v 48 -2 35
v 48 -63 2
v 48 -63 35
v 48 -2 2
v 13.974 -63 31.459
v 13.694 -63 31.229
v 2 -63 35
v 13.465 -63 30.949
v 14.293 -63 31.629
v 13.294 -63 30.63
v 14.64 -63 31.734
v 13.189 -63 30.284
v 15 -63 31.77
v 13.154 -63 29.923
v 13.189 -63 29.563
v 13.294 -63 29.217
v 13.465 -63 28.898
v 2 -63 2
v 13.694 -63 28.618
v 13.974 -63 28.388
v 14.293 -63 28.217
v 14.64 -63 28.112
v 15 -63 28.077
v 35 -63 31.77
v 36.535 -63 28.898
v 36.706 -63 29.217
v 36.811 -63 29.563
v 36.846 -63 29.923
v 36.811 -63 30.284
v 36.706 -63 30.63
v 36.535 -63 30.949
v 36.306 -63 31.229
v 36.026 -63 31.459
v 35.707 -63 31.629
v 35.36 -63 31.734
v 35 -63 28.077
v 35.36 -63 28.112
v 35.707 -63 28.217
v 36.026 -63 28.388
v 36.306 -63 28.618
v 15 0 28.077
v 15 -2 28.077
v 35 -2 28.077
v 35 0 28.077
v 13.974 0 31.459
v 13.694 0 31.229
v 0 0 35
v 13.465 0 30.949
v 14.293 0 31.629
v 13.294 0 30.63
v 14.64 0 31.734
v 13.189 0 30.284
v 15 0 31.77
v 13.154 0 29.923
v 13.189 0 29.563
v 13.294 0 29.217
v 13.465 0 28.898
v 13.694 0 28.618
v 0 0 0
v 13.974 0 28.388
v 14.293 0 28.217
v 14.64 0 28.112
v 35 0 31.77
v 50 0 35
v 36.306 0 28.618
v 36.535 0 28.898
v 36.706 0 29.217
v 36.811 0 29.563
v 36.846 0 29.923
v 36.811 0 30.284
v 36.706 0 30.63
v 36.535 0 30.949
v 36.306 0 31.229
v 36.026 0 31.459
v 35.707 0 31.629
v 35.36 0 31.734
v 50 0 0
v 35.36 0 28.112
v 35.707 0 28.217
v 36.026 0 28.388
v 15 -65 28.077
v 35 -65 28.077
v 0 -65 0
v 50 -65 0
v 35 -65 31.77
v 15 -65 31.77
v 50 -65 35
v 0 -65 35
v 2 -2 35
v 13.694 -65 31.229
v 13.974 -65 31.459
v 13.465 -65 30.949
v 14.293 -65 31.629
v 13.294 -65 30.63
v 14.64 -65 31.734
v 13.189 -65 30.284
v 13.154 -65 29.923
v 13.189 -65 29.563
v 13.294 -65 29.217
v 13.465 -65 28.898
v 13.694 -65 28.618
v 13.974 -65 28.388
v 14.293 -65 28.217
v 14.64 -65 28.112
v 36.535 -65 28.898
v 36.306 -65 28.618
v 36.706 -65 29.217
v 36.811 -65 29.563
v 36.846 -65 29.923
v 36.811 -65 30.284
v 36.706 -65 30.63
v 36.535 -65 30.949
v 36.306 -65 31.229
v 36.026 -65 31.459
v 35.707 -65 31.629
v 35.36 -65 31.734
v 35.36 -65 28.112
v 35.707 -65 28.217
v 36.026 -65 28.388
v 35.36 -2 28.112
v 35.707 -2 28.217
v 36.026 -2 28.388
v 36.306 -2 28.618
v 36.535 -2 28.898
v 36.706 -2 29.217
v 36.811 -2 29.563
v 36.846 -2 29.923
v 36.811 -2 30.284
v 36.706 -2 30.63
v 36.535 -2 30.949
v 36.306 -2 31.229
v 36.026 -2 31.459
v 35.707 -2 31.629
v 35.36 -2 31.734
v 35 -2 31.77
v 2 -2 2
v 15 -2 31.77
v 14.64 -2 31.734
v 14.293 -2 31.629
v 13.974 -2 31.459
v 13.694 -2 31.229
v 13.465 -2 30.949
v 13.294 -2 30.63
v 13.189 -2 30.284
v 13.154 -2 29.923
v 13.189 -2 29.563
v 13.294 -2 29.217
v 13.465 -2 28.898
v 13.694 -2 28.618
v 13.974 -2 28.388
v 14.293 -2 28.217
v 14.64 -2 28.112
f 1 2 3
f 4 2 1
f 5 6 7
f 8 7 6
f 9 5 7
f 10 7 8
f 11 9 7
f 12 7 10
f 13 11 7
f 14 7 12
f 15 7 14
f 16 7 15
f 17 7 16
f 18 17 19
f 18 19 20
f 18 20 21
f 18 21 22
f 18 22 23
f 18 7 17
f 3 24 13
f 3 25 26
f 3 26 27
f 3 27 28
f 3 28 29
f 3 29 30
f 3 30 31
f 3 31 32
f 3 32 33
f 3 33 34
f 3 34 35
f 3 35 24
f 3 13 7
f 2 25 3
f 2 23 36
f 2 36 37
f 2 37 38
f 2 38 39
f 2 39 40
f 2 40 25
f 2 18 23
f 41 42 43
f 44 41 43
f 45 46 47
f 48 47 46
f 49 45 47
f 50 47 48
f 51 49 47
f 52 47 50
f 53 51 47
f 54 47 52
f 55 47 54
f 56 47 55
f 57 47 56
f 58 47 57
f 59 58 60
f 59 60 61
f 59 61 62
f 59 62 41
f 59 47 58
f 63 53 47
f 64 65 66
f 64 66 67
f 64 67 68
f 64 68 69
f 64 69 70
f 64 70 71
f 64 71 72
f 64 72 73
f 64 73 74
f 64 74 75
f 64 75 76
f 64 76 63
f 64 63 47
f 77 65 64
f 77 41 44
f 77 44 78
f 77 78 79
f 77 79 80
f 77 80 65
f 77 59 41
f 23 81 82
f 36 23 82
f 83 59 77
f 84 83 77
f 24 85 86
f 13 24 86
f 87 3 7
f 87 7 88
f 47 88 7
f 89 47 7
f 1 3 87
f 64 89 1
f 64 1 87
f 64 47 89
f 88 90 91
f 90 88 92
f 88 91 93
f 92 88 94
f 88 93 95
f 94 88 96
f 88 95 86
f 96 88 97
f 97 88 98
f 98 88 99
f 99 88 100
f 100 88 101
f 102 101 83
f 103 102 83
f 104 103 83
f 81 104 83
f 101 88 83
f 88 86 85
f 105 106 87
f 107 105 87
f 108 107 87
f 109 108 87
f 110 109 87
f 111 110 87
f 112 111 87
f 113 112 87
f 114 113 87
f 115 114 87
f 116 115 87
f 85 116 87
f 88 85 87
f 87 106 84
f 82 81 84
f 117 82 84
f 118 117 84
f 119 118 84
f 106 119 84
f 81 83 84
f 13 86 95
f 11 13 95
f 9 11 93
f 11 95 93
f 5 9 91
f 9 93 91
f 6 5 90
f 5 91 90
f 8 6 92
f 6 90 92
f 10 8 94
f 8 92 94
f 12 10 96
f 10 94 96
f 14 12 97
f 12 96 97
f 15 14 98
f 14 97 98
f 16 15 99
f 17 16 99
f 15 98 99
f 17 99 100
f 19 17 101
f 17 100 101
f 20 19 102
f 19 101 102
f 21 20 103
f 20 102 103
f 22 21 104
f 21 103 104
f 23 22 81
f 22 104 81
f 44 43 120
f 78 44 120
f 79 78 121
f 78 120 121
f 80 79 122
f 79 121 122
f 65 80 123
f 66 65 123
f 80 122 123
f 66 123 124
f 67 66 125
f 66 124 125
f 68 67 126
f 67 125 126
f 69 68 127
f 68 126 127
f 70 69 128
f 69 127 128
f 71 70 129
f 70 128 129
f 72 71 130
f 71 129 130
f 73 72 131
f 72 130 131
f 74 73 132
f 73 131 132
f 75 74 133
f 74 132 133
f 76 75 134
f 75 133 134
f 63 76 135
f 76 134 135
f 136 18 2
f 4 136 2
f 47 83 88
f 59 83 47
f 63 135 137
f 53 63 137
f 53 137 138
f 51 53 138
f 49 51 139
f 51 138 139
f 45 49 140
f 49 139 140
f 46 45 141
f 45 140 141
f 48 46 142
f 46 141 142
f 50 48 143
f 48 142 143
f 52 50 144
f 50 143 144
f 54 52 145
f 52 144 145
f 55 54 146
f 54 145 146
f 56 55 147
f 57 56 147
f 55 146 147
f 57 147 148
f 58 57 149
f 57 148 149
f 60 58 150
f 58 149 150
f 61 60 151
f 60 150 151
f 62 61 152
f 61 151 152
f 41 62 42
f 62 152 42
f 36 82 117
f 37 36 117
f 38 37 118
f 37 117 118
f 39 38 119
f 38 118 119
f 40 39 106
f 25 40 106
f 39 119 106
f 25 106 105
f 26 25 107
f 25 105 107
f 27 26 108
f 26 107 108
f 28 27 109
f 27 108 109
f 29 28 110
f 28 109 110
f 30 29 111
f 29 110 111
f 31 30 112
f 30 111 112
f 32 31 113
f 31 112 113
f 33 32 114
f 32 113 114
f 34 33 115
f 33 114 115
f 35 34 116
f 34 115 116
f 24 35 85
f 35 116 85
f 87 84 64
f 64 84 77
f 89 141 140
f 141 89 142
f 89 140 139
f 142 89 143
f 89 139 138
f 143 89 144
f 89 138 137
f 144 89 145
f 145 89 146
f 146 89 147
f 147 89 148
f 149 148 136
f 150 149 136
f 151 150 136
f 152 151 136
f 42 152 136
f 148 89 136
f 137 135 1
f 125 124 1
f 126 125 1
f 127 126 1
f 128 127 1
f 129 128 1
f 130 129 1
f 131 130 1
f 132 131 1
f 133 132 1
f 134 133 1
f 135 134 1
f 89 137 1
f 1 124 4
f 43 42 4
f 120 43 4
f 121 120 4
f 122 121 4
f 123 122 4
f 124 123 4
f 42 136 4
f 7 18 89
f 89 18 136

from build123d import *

# Parameters (mm, degrees)
F0_W     = 50
F0_H     = 65
F1_DEPTH = 35
F2_T     = -2
F4_DEPTH = 100


with BuildPart() as f1:
    # F0 (on Top) → F1 (new body)
    with BuildSketch(Plane.XY):
        with Locations((25, -32.5)):
            Rectangle(F0_W, F0_H)
    extrude(amount=F1_DEPTH)

    # F2
    f2_openings = [f1.faces().sort_by_distance(p)[0] for p in [
        (25, -32.5, 35),
    ]]
    offset(amount=F2_T, openings=f2_openings)

    # F3 (on face) → F4 (cut, symmetric)
    with BuildSketch(Plane.XZ.offset(65)):
        with BuildLine():
            Line((35, 31.769874), (15, 31.769874))
            ThreePointArc((15, 31.769874), (13.153528, 29.923402), (15, 28.076929))
            Line((15, 28.076929), (35, 28.076929))
            ThreePointArc((35, 28.076929), (36.846472, 29.923402), (35, 31.769874))
        make_face()
    extrude(amount=F4_DEPTH, both=True, mode=Mode.SUBTRACT)


solid = f1.part
